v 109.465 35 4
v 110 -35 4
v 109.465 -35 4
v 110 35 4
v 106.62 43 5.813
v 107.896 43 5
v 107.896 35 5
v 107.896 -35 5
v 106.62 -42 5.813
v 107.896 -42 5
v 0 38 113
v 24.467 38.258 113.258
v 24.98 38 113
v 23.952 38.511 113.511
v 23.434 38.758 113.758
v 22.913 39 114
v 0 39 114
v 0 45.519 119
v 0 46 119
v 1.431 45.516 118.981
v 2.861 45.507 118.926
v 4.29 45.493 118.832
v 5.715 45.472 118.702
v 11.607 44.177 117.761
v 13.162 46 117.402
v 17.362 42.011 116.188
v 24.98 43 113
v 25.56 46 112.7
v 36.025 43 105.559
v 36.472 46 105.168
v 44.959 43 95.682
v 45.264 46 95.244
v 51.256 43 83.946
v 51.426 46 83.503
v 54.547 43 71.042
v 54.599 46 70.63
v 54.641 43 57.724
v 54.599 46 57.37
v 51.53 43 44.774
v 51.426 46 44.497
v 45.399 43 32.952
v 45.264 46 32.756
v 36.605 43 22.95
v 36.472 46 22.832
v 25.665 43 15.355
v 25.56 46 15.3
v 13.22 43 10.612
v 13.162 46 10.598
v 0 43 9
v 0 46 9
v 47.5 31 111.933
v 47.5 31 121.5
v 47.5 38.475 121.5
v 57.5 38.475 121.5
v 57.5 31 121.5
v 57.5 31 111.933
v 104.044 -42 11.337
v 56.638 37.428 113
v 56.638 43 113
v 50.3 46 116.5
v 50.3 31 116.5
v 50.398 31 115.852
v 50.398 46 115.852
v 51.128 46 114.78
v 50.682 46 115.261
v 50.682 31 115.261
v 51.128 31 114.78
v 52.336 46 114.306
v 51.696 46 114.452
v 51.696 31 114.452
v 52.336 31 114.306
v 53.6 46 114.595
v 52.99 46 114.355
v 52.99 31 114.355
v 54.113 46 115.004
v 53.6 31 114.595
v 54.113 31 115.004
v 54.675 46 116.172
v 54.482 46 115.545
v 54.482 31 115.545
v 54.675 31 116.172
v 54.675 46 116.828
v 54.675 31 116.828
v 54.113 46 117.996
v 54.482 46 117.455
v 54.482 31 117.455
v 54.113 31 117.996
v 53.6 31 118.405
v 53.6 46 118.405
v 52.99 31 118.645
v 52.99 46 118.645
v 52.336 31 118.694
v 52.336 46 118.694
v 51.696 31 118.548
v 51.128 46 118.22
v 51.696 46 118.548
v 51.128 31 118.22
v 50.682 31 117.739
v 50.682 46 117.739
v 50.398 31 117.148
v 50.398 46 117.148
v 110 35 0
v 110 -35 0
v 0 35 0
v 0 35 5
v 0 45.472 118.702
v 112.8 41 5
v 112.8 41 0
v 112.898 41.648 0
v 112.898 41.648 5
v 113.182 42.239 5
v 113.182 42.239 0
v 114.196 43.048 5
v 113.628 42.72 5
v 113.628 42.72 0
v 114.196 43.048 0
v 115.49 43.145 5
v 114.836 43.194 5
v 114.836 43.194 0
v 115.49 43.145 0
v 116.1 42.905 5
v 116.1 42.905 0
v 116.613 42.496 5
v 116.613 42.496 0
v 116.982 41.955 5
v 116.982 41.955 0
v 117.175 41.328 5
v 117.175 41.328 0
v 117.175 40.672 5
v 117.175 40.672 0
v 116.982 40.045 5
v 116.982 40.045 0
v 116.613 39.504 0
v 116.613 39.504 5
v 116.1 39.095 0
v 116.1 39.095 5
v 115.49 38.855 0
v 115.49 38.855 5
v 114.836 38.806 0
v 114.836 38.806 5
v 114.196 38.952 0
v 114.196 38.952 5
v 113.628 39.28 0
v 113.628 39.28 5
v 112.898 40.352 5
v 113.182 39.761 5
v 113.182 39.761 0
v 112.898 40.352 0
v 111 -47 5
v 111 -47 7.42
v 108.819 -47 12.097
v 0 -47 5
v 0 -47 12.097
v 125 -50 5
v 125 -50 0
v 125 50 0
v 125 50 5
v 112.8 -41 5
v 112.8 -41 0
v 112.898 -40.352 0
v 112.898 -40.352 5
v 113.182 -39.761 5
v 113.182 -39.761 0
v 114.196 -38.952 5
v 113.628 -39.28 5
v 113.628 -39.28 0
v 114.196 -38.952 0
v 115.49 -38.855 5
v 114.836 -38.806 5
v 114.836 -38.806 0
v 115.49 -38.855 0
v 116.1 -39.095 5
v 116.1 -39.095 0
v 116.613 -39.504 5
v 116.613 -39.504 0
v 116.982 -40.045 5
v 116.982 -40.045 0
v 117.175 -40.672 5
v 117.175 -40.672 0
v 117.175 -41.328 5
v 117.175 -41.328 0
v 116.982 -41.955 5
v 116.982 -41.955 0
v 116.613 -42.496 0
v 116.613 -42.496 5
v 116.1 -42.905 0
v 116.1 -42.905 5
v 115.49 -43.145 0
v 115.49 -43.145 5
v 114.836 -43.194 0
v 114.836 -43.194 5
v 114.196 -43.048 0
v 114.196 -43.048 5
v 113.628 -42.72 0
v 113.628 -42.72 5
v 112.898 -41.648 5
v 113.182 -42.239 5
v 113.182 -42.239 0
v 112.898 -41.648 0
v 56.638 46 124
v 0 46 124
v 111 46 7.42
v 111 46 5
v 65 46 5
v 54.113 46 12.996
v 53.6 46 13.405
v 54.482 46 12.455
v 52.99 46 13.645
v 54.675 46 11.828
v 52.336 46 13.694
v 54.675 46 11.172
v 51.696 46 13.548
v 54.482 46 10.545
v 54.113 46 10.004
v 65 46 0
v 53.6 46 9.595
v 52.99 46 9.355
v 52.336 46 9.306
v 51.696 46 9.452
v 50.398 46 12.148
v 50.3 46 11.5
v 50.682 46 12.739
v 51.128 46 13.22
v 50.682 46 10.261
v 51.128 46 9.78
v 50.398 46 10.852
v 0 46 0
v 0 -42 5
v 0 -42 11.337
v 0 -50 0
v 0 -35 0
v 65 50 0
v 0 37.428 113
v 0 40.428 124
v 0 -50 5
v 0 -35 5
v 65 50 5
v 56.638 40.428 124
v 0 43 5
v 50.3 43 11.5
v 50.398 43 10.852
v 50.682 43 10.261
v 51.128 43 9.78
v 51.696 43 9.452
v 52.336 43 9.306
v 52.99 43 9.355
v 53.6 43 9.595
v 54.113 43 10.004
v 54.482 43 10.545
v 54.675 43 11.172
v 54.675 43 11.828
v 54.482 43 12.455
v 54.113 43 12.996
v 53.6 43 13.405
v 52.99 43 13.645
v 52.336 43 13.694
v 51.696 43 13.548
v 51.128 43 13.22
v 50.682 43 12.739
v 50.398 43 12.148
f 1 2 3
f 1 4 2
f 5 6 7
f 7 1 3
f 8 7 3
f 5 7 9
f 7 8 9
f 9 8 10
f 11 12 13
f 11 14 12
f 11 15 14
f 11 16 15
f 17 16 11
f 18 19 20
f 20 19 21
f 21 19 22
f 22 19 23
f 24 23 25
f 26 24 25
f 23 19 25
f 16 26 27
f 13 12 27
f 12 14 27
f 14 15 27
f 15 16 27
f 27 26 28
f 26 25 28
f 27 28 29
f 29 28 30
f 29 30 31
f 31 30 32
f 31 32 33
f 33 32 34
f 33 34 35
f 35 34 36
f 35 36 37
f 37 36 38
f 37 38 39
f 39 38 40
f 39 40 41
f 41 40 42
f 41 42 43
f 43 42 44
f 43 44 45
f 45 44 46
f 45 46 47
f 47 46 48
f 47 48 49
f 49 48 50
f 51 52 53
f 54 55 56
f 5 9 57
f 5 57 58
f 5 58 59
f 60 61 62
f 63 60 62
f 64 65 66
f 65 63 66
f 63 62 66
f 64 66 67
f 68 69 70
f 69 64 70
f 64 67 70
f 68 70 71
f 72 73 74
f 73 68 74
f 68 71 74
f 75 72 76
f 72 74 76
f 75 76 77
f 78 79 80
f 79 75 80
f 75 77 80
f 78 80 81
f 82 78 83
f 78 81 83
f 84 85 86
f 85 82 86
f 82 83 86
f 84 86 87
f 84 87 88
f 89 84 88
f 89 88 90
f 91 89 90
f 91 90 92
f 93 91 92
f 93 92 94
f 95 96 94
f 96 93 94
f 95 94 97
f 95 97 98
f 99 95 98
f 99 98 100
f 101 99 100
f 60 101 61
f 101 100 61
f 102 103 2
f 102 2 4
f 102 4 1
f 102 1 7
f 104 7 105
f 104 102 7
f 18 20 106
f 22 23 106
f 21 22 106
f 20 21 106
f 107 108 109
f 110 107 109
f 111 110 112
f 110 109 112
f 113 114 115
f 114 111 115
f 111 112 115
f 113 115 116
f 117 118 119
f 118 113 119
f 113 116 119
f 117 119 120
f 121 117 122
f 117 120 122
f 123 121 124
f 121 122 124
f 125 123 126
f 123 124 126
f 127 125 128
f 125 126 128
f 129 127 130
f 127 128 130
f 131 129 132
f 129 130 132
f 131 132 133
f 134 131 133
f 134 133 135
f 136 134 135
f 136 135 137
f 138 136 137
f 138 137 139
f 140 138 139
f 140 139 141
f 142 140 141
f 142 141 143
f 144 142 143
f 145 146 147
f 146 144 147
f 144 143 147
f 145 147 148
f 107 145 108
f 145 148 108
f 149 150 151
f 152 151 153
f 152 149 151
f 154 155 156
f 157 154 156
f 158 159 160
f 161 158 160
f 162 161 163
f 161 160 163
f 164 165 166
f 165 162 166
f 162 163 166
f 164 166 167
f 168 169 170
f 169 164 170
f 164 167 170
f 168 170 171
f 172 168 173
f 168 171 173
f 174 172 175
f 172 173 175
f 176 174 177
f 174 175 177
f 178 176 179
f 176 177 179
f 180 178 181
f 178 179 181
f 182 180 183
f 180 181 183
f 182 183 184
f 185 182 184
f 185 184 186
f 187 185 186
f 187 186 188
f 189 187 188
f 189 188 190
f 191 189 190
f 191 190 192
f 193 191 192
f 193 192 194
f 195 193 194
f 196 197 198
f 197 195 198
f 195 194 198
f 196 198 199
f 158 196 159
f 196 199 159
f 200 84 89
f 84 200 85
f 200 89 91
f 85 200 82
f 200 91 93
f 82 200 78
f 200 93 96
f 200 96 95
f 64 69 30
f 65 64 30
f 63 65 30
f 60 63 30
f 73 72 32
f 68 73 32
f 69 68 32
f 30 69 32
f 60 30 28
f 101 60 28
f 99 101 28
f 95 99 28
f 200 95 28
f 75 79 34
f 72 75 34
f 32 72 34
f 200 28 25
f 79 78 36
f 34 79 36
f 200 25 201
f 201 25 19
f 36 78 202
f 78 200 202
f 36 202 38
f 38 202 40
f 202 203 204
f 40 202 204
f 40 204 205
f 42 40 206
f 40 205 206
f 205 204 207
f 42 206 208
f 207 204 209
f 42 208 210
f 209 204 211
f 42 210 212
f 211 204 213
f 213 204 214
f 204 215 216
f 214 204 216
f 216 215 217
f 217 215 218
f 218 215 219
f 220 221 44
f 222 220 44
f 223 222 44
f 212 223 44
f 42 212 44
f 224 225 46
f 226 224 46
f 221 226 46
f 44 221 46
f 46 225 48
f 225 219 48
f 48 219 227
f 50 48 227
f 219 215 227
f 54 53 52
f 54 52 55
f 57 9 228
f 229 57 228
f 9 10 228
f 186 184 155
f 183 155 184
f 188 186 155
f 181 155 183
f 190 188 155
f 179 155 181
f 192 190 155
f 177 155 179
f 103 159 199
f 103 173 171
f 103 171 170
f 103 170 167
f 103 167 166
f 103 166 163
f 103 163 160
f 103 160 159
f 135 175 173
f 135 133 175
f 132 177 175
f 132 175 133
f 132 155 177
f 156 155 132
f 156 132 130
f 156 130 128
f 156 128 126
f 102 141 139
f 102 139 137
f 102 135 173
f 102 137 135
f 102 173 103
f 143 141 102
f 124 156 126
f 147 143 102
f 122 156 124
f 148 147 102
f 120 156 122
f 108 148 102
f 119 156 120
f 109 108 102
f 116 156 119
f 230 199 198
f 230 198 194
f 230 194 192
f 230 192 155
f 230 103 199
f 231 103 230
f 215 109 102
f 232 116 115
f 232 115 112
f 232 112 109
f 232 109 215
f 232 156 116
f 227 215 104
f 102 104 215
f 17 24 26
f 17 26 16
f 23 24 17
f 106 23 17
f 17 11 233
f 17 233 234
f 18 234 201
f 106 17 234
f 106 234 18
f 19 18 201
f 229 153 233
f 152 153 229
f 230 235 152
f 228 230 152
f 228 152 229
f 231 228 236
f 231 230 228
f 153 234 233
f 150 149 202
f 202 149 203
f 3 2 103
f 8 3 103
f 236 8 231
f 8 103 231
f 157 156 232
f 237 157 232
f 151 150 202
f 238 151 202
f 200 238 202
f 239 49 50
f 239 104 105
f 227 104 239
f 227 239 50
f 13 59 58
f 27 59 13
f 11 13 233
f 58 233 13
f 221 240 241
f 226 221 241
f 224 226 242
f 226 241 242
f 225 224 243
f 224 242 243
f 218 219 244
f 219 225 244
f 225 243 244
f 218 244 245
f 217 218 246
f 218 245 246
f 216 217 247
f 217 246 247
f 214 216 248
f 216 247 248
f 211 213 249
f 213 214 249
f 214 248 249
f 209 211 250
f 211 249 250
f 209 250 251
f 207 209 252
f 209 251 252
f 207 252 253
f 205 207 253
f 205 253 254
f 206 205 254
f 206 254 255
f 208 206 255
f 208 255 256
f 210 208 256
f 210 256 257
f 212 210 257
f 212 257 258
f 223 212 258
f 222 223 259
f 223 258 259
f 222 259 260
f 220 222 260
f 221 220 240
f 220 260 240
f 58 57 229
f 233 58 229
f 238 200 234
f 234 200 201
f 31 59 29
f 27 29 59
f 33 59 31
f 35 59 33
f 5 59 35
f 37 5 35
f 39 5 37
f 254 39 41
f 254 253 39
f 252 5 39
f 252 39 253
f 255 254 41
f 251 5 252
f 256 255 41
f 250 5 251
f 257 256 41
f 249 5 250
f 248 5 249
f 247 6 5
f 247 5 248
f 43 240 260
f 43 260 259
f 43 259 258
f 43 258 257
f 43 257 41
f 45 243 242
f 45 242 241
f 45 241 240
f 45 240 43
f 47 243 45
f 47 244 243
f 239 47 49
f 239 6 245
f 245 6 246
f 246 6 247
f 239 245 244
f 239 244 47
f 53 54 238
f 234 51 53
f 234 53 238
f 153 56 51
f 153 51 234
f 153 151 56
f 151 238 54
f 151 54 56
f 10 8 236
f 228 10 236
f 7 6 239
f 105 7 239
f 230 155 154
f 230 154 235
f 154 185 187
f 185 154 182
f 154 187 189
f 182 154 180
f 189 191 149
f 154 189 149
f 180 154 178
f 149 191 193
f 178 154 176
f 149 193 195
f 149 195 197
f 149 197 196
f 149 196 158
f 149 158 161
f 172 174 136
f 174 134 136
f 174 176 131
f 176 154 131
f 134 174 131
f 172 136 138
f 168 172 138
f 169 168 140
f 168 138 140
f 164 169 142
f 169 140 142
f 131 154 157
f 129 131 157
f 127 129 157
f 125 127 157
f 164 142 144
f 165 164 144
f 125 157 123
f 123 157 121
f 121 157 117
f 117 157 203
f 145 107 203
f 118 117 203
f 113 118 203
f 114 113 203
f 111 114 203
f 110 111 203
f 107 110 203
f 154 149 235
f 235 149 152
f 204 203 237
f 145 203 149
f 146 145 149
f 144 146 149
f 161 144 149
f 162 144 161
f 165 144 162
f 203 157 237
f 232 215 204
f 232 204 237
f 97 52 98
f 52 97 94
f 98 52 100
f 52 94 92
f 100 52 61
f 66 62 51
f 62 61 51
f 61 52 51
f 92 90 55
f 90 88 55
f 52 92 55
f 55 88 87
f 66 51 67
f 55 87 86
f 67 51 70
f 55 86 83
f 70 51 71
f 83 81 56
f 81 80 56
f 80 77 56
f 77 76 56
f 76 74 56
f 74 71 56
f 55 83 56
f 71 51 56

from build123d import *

# Parameters (mm, degrees)
BOX015_W               = 30
BOX015_H               = 9
BOX015_DEPTH           = 5
BOX015_ROLL_ANGLE      = 36
CHAMFER005_SIZE        = 1
BOX014_W               = 150
BOX014_H               = 150
BOX014_DEPTH           = 150
CYLINDER007_R          = 2.2
CYLINDER007_DEPTH      = 50
CYLINDER005_R          = 2.2
CYLINDER005_DEPTH      = 50
CYLINDER006_R          = 2.2
CYLINDER006_DEPTH      = 50
CYLINDER004_R          = 2.2
CYLINDER004_DEPTH      = 50
FUSION_ROLL_ANGLE      = -90
BOX013_W               = 10
BOX013_H               = 8
BOX013_DEPTH           = 10
CHAMFER003_SIZE        = 6
BOX012_W               = 10
BOX012_H               = 8
BOX012_DEPTH           = 10
CHAMFER002_SIZE        = 6
BOX011_W               = 130
BOX011_H               = 10
BOX011_DEPTH           = 10
CYLINDER002_R          = 2.2
CYLINDER002_DEPTH      = 50
CYLINDER003_R          = 2.2
CYLINDER003_DEPTH      = 50
CYLINDER001_R          = 2.2
CYLINDER001_DEPTH      = 50
CYLINDER_R             = 2.2
CYLINDER_DEPTH         = 50
BOX001_W               = 220
BOX001_H               = 70
BOX001_DEPTH           = 12
BOX_W                  = 250
BOX_H                  = 100
BOX_DEPTH              = 5
CYLINDER008_R          = 55
CYLINDER008_DEPTH      = 10
CYLINDER008_ROLL_ANGLE = 90
BOX010_W               = 300
BOX010_H               = 20
BOX010_DEPTH           = 41
BOX008_W               = 234
BOX008_H               = 93
BOX008_DEPTH           = 249
BOX008_ROLL_ANGLE      = -38
BOX009_W               = 120
BOX009_H               = 104
BOX009_DEPTH           = 200
BOX009_PLACEMENT_ANGLE = 25
BOX006_W               = 120
BOX006_H               = 104
BOX006_DEPTH           = 200
BOX006_PLACEMENT_ANGLE = 25
BOX007_W               = 222
BOX007_H               = 93
BOX007_DEPTH           = 120
BOX004_W               = 234
BOX004_H               = 93
BOX004_DEPTH           = 249
BOX004_ROLL_ANGLE      = -38
BOX005_W               = 120
BOX005_H               = 104
BOX005_DEPTH           = 200
BOX005_PLACEMENT_ANGLE = 25
BOX002_W               = 120
BOX002_H               = 104
BOX002_DEPTH           = 200
BOX002_PLACEMENT_ANGLE = 25
BOX003_W               = 222
BOX003_H               = 93
BOX003_DEPTH           = 120
CHAMFER_SIZE           = 2
CHAMFER001_SIZE        = 2
CHAMFER004_SIZE        = 1


with BuildPart() as chamfer005:
    # Box015 → Box015 (new body)
    with BuildSketch(Plane.XY):
        with Locations((15, 4.5)):
            Rectangle(BOX015_W, BOX015_H)
    extrude(amount=BOX015_DEPTH)


with BuildPart() as chamfer005_1:
    # Box015 roll: moved
    add(chamfer005.part.rotate(Axis((0, 0, 0), (1, 0, 0)), BOX015_ROLL_ANGLE))


with BuildPart() as chamfer005_2:
    # Box015 placement: moved
    add(chamfer005_1.part.moved(Location((-30, 39, 114))))

    # Chamfer005
    chamfer005_edges = [chamfer005_2.edges().sort_by_distance(p)[0] for p in [
        (-15, 46.281153, 119.290067),
    ]]
    chamfer(chamfer005_edges, length=CHAMFER005_SIZE)


with BuildPart() as cube014:
    # Box014 → Box014 (new body)
    with BuildSketch(Plane(origin=(0, -70, -1), x_dir=(1, 0, 0), z_dir=(0, 0, 1))):
        with Locations((75, 75)):
            Rectangle(BOX014_W, BOX014_H)
    extrude(amount=BOX014_DEPTH)


with BuildPart() as cylinder007:
    # Cylinder007 → Cylinder007 (new body)
    with BuildSketch(Plane(origin=(52.5, -52.5, 0), x_dir=(1, 0, 0), z_dir=(0, 0, 1))):
        Circle(CYLINDER007_R)
    extrude(amount=CYLINDER007_DEPTH)


with BuildPart() as cylinder005:
    # Cylinder005 → Cylinder005 (new body)
    with BuildSketch(Plane(origin=(52.5, 52.5, 0), x_dir=(1, 0, 0), z_dir=(0, 0, 1))):
        Circle(CYLINDER005_R)
    extrude(amount=CYLINDER005_DEPTH)


with BuildPart() as cylinder006:
    # Cylinder006 → Cylinder006 (new body)
    with BuildSketch(Plane(origin=(-52.5, 52.5, 0), x_dir=(1, 0, 0), z_dir=(0, 0, 1))):
        Circle(CYLINDER006_R)
    extrude(amount=CYLINDER006_DEPTH)


with BuildPart() as fan_holes:
    # Cylinder004 → Cylinder004 (new body)
    with BuildSketch(Plane(origin=(-52.5, -52.5, 0), x_dir=(1, 0, 0), z_dir=(0, 0, 1))):
        Circle(CYLINDER004_R)
    extrude(amount=CYLINDER004_DEPTH)

    # Fusion: union Cylinder007, Cylinder005, Cylinder006
    add(cylinder007.part)
    add(cylinder005.part)
    add(cylinder006.part)


with BuildPart() as fan_holes_1:
    # Fusion roll: moved
    add(fan_holes.part.rotate(Axis((0, 0, 0), (1, 0, 0)), FUSION_ROLL_ANGLE))


with BuildPart() as fan_holes_2:
    # Fusion placement: moved
    add(fan_holes_1.part.moved(Location((0, 15, 64))))


with BuildPart() as chamfer003:
    # Box013 → Box013 (new body)
    with BuildSketch(Plane(origin=(47.5, 31, 111.5), x_dir=(1, 0, 0), z_dir=(0, 0, 1))):
        with Locations((5, 4)):
            Rectangle(BOX013_W, BOX013_H)
    extrude(amount=BOX013_DEPTH)

    # Chamfer003
    chamfer003_edges = [chamfer003.edges().sort_by_distance(p)[0] for p in [
        (52.5, 39, 111.5),
    ]]
    chamfer(chamfer003_edges, length=CHAMFER003_SIZE)


with BuildPart() as part_mirroring002:
    # Part__Mirroring002: instance of Chamfer003
    add(chamfer003.part.mirror(Plane(origin=(0, 0, 0), x_dir=(0, -1, 0), z_dir=(1, 0, 0))))


with BuildPart() as chamfer002:
    # Box012 → Box012 (new body)
    with BuildSketch(Plane(origin=(47.5, 31, 111.5), x_dir=(1, 0, 0), z_dir=(0, 0, 1))):
        with Locations((5, 4)):
            Rectangle(BOX012_W, BOX012_H)
    extrude(amount=BOX012_DEPTH)

    # Chamfer002
    chamfer002_edges = [chamfer002.edges().sort_by_distance(p)[0] for p in [
        (52.5, 39, 111.5),
    ]]
    chamfer(chamfer002_edges, length=CHAMFER002_SIZE)


with BuildPart() as cube011:
    # Box011 → Box011 (new body)
    with BuildSketch(Plane(origin=(-65, 46, -2), x_dir=(1, 0, 0), z_dir=(0, 0, 1))):
        with Locations((65, 5)):
            Rectangle(BOX011_W, BOX011_H)
    extrude(amount=BOX011_DEPTH)


with BuildPart() as cylinder002:
    # Cylinder002 → Cylinder002 (new body)
    with BuildSketch(Plane(origin=(-115, 41, 0), x_dir=(1, 0, 0), z_dir=(0, 0, 1))):
        Circle(CYLINDER002_R)
    extrude(amount=CYLINDER002_DEPTH)


with BuildPart() as cylinder003:
    # Cylinder003 → Cylinder003 (new body)
    with BuildSketch(Plane(origin=(115, 41, 0), x_dir=(1, 0, 0), z_dir=(0, 0, 1))):
        Circle(CYLINDER003_R)
    extrude(amount=CYLINDER003_DEPTH)


with BuildPart() as cylinder001:
    # Cylinder001 → Cylinder001 (new body)
    with BuildSketch(Plane(origin=(115, -41, 0), x_dir=(1, 0, 0), z_dir=(0, 0, 1))):
        Circle(CYLINDER001_R)
    extrude(amount=CYLINDER001_DEPTH)


with BuildPart() as mount_holes:
    # Cylinder → Cylinder (new body)
    with BuildSketch(Plane(origin=(-115, -41, 0), x_dir=(1, 0, 0), z_dir=(0, 0, 1))):
        Circle(CYLINDER_R)
    extrude(amount=CYLINDER_DEPTH)

    # Fusion001: union Cylinder002, Cylinder003, Cylinder001
    add(cylinder002.part)
    add(cylinder003.part)
    add(cylinder001.part)


with BuildPart() as mount_holes_1:
    # Fusion001 placement: moved
    add(mount_holes.part.moved(Location((0, 0, -1))))


with BuildPart() as cube001:
    # Box001 → Box001 (new body)
    with BuildSketch(Plane(origin=(-110, -35, -1), x_dir=(1, 0, 0), z_dir=(0, 0, 1))):
        with Locations((110, 35)):
            Rectangle(BOX001_W, BOX001_H)
    extrude(amount=BOX001_DEPTH)


with BuildPart() as cut001:
    # Box → Box (new body)
    with BuildSketch(Plane(origin=(-125, -50, 0), x_dir=(1, 0, 0), z_dir=(0, 0, 1))):
        with Locations((125, 50)):
            Rectangle(BOX_W, BOX_H)
    extrude(amount=BOX_DEPTH)

    # Cut: cut Cube001
    add(cube001.part, mode=Mode.SUBTRACT)

    # Cut001: cut mount-holes
    add(mount_holes_1.part, mode=Mode.SUBTRACT)


with BuildPart() as cylinder008:
    # Cylinder008 → Cylinder008 (new body)
    with BuildSketch(Plane.XY):
        Circle(CYLINDER008_R)
    extrude(amount=CYLINDER008_DEPTH)


with BuildPart() as cylinder008_1:
    # Cylinder008 roll: moved
    add(cylinder008.part.rotate(Axis((0, 0, 0), (1, 0, 0)), CYLINDER008_ROLL_ANGLE))


with BuildPart() as cylinder008_2:
    # Cylinder008 placement: moved
    add(cylinder008_1.part.moved(Location((0, 49, 64))))


with BuildPart() as cube010:
    # Box010 → Box010 (new body)
    with BuildSketch(Plane(origin=(-150, -62, -12), x_dir=(1, 0, 0), z_dir=(0, 0, 1))):
        with Locations((150, 10)):
            Rectangle(BOX010_W, BOX010_H)
    extrude(amount=BOX010_DEPTH)


with BuildPart() as cube008:
    # Box008 → Box008 (new body)
    with BuildSketch(Plane.XY):
        with Locations((117, 46.5)):
            Rectangle(BOX008_W, BOX008_H)
    extrude(amount=BOX008_DEPTH)


with BuildPart() as cube008_1:
    # Box008 roll: moved
    add(cube008.part.rotate(Axis((0, 0, 0), (1, 0, 0)), BOX008_ROLL_ANGLE))


with BuildPart() as cube008_2:
    # Box008 placement: moved
    add(cube008_1.part.moved(Location((-121, -144, 39))))


with BuildPart() as cube009:
    # Box009 → Box009 (new body)
    with BuildSketch(Plane.XY):
        with Locations((60, 52)):
            Rectangle(BOX009_W, BOX009_H)
    extrude(amount=BOX009_DEPTH)


with BuildPart() as cube009_1:
    # Box009 placement: moved
    add(cube009.part.moved(Location((-245, -55, 4))).rotate(Axis((-245, -55, 4), (0, 1, 0)), BOX009_PLACEMENT_ANGLE))


with BuildPart() as part_mirroring001:
    # Part__Mirroring001: instance of Cube009
    add(cube009_1.part.mirror(Plane(origin=(0, 0, 0), x_dir=(0, -1, 0), z_dir=(1, 0, 0))))


with BuildPart() as fusion003:
    # Box006 → Box006 (new body)
    with BuildSketch(Plane.XY):
        with Locations((60, 52)):
            Rectangle(BOX006_W, BOX006_H)
    extrude(amount=BOX006_DEPTH)


with BuildPart() as fusion003_1:
    # Box006 placement: moved
    add(fusion003.part.moved(Location((-245, -55, 4))).rotate(Axis((-245, -55, 4), (0, 1, 0)), BOX006_PLACEMENT_ANGLE))

    # Fusion003: union Part__Mirroring001
    add(part_mirroring001.part)


with BuildPart() as cut006:
    # Box007 → Box007 (new body)
    with BuildSketch(Plane(origin=(-111, -47, 4), x_dir=(1, 0, 0), z_dir=(0, 0, 1))):
        with Locations((111, 46.5)):
            Rectangle(BOX007_W, BOX007_H)
    extrude(amount=BOX007_DEPTH)

    # Cut004: cut Fusion003
    add(fusion003_1.part, mode=Mode.SUBTRACT)

    # Cut005: cut Cube008
    add(cube008_2.part, mode=Mode.SUBTRACT)


with BuildPart() as cut006_1:
    # Cut005 placement: moved
    add(cut006.part.moved(Location((0, -3, -11))))

    # Cut006: cut Cube010
    add(cube010.part, mode=Mode.SUBTRACT)


with BuildPart() as cube004:
    # Box004 → Box004 (new body)
    with BuildSketch(Plane.XY):
        with Locations((117, 46.5)):
            Rectangle(BOX004_W, BOX004_H)
    extrude(amount=BOX004_DEPTH)


with BuildPart() as cube004_1:
    # Box004 roll: moved
    add(cube004.part.rotate(Axis((0, 0, 0), (1, 0, 0)), BOX004_ROLL_ANGLE))


with BuildPart() as cube004_2:
    # Box004 placement: moved
    add(cube004_1.part.moved(Location((-121, -144, 39))))


with BuildPart() as cube005:
    # Box005 → Box005 (new body)
    with BuildSketch(Plane.XY):
        with Locations((60, 52)):
            Rectangle(BOX005_W, BOX005_H)
    extrude(amount=BOX005_DEPTH)


with BuildPart() as cube005_1:
    # Box005 placement: moved
    add(cube005.part.moved(Location((-245, -55, 4))).rotate(Axis((-245, -55, 4), (0, 1, 0)), BOX005_PLACEMENT_ANGLE))


with BuildPart() as part_mirroring:
    # Part__Mirroring: instance of Cube005
    add(cube005_1.part.mirror(Plane(origin=(0, 0, 0), x_dir=(0, -1, 0), z_dir=(1, 0, 0))))


with BuildPart() as fusion002:
    # Box002 → Box002 (new body)
    with BuildSketch(Plane.XY):
        with Locations((60, 52)):
            Rectangle(BOX002_W, BOX002_H)
    extrude(amount=BOX002_DEPTH)


with BuildPart() as fusion002_1:
    # Box002 placement: moved
    add(fusion002.part.moved(Location((-245, -55, 4))).rotate(Axis((-245, -55, 4), (0, 1, 0)), BOX002_PLACEMENT_ANGLE))

    # Fusion002: union Part__Mirroring
    add(part_mirroring.part)


with BuildPart() as fusion006:
    # Box003 → Box003 (new body)
    with BuildSketch(Plane(origin=(-111, -47, 4), x_dir=(1, 0, 0), z_dir=(0, 0, 1))):
        with Locations((111, 46.5)):
            Rectangle(BOX003_W, BOX003_H)
    extrude(amount=BOX003_DEPTH)

    # Cut002: cut Fusion002
    add(fusion002_1.part, mode=Mode.SUBTRACT)

    # Cut003: cut Cube004
    add(cube004_2.part, mode=Mode.SUBTRACT)

    # Cut007: cut Cut006
    add(cut006_1.part, mode=Mode.SUBTRACT)

    # Cut008: cut Cylinder008
    add(cylinder008_2.part, mode=Mode.SUBTRACT)

    # Fusion004: union Cut001
    add(cut001.part)

    # Cut009: cut Cube011
    add(cube011.part, mode=Mode.SUBTRACT)

    # Chamfer
    chamfer_edges = [fusion006.edges().sort_by_distance(p)[0] for p in [
        (107.465265, 0, 4),
    ]]
    chamfer(chamfer_edges, length=CHAMFER_SIZE)

    # Chamfer001
    chamfer001_edges = [fusion006.edges().sort_by_distance(p)[0] for p in [
        (-107.465265, 0, 4),
    ]]
    chamfer(chamfer001_edges, length=CHAMFER001_SIZE)

    # Fusion005: union Part__Mirroring002, Chamfer002
    add(part_mirroring002.part)
    add(chamfer002.part)

    # Cut010: cut fan-holes
    add(fan_holes_2.part, mode=Mode.SUBTRACT)

    # Chamfer004
    chamfer004_edges = [fusion006.edges().sort_by_distance(p)[0] for p in [
        (0, 39, 113),
    ]]
    chamfer(chamfer004_edges, length=CHAMFER004_SIZE)

    # Cut011: cut Cube014
    add(cube014.part, mode=Mode.SUBTRACT)

    # Fusion006: union Chamfer005
    add(chamfer005_2.part)


with BuildPart() as part_mirroring003:
    # Part__Mirroring003: instance of Fusion006
    add(fusion006.part.mirror(Plane(origin=(0, 0, 0), x_dir=(0, -1, 0), z_dir=(1, 0, 0))))


solid = part_mirroring003.part
